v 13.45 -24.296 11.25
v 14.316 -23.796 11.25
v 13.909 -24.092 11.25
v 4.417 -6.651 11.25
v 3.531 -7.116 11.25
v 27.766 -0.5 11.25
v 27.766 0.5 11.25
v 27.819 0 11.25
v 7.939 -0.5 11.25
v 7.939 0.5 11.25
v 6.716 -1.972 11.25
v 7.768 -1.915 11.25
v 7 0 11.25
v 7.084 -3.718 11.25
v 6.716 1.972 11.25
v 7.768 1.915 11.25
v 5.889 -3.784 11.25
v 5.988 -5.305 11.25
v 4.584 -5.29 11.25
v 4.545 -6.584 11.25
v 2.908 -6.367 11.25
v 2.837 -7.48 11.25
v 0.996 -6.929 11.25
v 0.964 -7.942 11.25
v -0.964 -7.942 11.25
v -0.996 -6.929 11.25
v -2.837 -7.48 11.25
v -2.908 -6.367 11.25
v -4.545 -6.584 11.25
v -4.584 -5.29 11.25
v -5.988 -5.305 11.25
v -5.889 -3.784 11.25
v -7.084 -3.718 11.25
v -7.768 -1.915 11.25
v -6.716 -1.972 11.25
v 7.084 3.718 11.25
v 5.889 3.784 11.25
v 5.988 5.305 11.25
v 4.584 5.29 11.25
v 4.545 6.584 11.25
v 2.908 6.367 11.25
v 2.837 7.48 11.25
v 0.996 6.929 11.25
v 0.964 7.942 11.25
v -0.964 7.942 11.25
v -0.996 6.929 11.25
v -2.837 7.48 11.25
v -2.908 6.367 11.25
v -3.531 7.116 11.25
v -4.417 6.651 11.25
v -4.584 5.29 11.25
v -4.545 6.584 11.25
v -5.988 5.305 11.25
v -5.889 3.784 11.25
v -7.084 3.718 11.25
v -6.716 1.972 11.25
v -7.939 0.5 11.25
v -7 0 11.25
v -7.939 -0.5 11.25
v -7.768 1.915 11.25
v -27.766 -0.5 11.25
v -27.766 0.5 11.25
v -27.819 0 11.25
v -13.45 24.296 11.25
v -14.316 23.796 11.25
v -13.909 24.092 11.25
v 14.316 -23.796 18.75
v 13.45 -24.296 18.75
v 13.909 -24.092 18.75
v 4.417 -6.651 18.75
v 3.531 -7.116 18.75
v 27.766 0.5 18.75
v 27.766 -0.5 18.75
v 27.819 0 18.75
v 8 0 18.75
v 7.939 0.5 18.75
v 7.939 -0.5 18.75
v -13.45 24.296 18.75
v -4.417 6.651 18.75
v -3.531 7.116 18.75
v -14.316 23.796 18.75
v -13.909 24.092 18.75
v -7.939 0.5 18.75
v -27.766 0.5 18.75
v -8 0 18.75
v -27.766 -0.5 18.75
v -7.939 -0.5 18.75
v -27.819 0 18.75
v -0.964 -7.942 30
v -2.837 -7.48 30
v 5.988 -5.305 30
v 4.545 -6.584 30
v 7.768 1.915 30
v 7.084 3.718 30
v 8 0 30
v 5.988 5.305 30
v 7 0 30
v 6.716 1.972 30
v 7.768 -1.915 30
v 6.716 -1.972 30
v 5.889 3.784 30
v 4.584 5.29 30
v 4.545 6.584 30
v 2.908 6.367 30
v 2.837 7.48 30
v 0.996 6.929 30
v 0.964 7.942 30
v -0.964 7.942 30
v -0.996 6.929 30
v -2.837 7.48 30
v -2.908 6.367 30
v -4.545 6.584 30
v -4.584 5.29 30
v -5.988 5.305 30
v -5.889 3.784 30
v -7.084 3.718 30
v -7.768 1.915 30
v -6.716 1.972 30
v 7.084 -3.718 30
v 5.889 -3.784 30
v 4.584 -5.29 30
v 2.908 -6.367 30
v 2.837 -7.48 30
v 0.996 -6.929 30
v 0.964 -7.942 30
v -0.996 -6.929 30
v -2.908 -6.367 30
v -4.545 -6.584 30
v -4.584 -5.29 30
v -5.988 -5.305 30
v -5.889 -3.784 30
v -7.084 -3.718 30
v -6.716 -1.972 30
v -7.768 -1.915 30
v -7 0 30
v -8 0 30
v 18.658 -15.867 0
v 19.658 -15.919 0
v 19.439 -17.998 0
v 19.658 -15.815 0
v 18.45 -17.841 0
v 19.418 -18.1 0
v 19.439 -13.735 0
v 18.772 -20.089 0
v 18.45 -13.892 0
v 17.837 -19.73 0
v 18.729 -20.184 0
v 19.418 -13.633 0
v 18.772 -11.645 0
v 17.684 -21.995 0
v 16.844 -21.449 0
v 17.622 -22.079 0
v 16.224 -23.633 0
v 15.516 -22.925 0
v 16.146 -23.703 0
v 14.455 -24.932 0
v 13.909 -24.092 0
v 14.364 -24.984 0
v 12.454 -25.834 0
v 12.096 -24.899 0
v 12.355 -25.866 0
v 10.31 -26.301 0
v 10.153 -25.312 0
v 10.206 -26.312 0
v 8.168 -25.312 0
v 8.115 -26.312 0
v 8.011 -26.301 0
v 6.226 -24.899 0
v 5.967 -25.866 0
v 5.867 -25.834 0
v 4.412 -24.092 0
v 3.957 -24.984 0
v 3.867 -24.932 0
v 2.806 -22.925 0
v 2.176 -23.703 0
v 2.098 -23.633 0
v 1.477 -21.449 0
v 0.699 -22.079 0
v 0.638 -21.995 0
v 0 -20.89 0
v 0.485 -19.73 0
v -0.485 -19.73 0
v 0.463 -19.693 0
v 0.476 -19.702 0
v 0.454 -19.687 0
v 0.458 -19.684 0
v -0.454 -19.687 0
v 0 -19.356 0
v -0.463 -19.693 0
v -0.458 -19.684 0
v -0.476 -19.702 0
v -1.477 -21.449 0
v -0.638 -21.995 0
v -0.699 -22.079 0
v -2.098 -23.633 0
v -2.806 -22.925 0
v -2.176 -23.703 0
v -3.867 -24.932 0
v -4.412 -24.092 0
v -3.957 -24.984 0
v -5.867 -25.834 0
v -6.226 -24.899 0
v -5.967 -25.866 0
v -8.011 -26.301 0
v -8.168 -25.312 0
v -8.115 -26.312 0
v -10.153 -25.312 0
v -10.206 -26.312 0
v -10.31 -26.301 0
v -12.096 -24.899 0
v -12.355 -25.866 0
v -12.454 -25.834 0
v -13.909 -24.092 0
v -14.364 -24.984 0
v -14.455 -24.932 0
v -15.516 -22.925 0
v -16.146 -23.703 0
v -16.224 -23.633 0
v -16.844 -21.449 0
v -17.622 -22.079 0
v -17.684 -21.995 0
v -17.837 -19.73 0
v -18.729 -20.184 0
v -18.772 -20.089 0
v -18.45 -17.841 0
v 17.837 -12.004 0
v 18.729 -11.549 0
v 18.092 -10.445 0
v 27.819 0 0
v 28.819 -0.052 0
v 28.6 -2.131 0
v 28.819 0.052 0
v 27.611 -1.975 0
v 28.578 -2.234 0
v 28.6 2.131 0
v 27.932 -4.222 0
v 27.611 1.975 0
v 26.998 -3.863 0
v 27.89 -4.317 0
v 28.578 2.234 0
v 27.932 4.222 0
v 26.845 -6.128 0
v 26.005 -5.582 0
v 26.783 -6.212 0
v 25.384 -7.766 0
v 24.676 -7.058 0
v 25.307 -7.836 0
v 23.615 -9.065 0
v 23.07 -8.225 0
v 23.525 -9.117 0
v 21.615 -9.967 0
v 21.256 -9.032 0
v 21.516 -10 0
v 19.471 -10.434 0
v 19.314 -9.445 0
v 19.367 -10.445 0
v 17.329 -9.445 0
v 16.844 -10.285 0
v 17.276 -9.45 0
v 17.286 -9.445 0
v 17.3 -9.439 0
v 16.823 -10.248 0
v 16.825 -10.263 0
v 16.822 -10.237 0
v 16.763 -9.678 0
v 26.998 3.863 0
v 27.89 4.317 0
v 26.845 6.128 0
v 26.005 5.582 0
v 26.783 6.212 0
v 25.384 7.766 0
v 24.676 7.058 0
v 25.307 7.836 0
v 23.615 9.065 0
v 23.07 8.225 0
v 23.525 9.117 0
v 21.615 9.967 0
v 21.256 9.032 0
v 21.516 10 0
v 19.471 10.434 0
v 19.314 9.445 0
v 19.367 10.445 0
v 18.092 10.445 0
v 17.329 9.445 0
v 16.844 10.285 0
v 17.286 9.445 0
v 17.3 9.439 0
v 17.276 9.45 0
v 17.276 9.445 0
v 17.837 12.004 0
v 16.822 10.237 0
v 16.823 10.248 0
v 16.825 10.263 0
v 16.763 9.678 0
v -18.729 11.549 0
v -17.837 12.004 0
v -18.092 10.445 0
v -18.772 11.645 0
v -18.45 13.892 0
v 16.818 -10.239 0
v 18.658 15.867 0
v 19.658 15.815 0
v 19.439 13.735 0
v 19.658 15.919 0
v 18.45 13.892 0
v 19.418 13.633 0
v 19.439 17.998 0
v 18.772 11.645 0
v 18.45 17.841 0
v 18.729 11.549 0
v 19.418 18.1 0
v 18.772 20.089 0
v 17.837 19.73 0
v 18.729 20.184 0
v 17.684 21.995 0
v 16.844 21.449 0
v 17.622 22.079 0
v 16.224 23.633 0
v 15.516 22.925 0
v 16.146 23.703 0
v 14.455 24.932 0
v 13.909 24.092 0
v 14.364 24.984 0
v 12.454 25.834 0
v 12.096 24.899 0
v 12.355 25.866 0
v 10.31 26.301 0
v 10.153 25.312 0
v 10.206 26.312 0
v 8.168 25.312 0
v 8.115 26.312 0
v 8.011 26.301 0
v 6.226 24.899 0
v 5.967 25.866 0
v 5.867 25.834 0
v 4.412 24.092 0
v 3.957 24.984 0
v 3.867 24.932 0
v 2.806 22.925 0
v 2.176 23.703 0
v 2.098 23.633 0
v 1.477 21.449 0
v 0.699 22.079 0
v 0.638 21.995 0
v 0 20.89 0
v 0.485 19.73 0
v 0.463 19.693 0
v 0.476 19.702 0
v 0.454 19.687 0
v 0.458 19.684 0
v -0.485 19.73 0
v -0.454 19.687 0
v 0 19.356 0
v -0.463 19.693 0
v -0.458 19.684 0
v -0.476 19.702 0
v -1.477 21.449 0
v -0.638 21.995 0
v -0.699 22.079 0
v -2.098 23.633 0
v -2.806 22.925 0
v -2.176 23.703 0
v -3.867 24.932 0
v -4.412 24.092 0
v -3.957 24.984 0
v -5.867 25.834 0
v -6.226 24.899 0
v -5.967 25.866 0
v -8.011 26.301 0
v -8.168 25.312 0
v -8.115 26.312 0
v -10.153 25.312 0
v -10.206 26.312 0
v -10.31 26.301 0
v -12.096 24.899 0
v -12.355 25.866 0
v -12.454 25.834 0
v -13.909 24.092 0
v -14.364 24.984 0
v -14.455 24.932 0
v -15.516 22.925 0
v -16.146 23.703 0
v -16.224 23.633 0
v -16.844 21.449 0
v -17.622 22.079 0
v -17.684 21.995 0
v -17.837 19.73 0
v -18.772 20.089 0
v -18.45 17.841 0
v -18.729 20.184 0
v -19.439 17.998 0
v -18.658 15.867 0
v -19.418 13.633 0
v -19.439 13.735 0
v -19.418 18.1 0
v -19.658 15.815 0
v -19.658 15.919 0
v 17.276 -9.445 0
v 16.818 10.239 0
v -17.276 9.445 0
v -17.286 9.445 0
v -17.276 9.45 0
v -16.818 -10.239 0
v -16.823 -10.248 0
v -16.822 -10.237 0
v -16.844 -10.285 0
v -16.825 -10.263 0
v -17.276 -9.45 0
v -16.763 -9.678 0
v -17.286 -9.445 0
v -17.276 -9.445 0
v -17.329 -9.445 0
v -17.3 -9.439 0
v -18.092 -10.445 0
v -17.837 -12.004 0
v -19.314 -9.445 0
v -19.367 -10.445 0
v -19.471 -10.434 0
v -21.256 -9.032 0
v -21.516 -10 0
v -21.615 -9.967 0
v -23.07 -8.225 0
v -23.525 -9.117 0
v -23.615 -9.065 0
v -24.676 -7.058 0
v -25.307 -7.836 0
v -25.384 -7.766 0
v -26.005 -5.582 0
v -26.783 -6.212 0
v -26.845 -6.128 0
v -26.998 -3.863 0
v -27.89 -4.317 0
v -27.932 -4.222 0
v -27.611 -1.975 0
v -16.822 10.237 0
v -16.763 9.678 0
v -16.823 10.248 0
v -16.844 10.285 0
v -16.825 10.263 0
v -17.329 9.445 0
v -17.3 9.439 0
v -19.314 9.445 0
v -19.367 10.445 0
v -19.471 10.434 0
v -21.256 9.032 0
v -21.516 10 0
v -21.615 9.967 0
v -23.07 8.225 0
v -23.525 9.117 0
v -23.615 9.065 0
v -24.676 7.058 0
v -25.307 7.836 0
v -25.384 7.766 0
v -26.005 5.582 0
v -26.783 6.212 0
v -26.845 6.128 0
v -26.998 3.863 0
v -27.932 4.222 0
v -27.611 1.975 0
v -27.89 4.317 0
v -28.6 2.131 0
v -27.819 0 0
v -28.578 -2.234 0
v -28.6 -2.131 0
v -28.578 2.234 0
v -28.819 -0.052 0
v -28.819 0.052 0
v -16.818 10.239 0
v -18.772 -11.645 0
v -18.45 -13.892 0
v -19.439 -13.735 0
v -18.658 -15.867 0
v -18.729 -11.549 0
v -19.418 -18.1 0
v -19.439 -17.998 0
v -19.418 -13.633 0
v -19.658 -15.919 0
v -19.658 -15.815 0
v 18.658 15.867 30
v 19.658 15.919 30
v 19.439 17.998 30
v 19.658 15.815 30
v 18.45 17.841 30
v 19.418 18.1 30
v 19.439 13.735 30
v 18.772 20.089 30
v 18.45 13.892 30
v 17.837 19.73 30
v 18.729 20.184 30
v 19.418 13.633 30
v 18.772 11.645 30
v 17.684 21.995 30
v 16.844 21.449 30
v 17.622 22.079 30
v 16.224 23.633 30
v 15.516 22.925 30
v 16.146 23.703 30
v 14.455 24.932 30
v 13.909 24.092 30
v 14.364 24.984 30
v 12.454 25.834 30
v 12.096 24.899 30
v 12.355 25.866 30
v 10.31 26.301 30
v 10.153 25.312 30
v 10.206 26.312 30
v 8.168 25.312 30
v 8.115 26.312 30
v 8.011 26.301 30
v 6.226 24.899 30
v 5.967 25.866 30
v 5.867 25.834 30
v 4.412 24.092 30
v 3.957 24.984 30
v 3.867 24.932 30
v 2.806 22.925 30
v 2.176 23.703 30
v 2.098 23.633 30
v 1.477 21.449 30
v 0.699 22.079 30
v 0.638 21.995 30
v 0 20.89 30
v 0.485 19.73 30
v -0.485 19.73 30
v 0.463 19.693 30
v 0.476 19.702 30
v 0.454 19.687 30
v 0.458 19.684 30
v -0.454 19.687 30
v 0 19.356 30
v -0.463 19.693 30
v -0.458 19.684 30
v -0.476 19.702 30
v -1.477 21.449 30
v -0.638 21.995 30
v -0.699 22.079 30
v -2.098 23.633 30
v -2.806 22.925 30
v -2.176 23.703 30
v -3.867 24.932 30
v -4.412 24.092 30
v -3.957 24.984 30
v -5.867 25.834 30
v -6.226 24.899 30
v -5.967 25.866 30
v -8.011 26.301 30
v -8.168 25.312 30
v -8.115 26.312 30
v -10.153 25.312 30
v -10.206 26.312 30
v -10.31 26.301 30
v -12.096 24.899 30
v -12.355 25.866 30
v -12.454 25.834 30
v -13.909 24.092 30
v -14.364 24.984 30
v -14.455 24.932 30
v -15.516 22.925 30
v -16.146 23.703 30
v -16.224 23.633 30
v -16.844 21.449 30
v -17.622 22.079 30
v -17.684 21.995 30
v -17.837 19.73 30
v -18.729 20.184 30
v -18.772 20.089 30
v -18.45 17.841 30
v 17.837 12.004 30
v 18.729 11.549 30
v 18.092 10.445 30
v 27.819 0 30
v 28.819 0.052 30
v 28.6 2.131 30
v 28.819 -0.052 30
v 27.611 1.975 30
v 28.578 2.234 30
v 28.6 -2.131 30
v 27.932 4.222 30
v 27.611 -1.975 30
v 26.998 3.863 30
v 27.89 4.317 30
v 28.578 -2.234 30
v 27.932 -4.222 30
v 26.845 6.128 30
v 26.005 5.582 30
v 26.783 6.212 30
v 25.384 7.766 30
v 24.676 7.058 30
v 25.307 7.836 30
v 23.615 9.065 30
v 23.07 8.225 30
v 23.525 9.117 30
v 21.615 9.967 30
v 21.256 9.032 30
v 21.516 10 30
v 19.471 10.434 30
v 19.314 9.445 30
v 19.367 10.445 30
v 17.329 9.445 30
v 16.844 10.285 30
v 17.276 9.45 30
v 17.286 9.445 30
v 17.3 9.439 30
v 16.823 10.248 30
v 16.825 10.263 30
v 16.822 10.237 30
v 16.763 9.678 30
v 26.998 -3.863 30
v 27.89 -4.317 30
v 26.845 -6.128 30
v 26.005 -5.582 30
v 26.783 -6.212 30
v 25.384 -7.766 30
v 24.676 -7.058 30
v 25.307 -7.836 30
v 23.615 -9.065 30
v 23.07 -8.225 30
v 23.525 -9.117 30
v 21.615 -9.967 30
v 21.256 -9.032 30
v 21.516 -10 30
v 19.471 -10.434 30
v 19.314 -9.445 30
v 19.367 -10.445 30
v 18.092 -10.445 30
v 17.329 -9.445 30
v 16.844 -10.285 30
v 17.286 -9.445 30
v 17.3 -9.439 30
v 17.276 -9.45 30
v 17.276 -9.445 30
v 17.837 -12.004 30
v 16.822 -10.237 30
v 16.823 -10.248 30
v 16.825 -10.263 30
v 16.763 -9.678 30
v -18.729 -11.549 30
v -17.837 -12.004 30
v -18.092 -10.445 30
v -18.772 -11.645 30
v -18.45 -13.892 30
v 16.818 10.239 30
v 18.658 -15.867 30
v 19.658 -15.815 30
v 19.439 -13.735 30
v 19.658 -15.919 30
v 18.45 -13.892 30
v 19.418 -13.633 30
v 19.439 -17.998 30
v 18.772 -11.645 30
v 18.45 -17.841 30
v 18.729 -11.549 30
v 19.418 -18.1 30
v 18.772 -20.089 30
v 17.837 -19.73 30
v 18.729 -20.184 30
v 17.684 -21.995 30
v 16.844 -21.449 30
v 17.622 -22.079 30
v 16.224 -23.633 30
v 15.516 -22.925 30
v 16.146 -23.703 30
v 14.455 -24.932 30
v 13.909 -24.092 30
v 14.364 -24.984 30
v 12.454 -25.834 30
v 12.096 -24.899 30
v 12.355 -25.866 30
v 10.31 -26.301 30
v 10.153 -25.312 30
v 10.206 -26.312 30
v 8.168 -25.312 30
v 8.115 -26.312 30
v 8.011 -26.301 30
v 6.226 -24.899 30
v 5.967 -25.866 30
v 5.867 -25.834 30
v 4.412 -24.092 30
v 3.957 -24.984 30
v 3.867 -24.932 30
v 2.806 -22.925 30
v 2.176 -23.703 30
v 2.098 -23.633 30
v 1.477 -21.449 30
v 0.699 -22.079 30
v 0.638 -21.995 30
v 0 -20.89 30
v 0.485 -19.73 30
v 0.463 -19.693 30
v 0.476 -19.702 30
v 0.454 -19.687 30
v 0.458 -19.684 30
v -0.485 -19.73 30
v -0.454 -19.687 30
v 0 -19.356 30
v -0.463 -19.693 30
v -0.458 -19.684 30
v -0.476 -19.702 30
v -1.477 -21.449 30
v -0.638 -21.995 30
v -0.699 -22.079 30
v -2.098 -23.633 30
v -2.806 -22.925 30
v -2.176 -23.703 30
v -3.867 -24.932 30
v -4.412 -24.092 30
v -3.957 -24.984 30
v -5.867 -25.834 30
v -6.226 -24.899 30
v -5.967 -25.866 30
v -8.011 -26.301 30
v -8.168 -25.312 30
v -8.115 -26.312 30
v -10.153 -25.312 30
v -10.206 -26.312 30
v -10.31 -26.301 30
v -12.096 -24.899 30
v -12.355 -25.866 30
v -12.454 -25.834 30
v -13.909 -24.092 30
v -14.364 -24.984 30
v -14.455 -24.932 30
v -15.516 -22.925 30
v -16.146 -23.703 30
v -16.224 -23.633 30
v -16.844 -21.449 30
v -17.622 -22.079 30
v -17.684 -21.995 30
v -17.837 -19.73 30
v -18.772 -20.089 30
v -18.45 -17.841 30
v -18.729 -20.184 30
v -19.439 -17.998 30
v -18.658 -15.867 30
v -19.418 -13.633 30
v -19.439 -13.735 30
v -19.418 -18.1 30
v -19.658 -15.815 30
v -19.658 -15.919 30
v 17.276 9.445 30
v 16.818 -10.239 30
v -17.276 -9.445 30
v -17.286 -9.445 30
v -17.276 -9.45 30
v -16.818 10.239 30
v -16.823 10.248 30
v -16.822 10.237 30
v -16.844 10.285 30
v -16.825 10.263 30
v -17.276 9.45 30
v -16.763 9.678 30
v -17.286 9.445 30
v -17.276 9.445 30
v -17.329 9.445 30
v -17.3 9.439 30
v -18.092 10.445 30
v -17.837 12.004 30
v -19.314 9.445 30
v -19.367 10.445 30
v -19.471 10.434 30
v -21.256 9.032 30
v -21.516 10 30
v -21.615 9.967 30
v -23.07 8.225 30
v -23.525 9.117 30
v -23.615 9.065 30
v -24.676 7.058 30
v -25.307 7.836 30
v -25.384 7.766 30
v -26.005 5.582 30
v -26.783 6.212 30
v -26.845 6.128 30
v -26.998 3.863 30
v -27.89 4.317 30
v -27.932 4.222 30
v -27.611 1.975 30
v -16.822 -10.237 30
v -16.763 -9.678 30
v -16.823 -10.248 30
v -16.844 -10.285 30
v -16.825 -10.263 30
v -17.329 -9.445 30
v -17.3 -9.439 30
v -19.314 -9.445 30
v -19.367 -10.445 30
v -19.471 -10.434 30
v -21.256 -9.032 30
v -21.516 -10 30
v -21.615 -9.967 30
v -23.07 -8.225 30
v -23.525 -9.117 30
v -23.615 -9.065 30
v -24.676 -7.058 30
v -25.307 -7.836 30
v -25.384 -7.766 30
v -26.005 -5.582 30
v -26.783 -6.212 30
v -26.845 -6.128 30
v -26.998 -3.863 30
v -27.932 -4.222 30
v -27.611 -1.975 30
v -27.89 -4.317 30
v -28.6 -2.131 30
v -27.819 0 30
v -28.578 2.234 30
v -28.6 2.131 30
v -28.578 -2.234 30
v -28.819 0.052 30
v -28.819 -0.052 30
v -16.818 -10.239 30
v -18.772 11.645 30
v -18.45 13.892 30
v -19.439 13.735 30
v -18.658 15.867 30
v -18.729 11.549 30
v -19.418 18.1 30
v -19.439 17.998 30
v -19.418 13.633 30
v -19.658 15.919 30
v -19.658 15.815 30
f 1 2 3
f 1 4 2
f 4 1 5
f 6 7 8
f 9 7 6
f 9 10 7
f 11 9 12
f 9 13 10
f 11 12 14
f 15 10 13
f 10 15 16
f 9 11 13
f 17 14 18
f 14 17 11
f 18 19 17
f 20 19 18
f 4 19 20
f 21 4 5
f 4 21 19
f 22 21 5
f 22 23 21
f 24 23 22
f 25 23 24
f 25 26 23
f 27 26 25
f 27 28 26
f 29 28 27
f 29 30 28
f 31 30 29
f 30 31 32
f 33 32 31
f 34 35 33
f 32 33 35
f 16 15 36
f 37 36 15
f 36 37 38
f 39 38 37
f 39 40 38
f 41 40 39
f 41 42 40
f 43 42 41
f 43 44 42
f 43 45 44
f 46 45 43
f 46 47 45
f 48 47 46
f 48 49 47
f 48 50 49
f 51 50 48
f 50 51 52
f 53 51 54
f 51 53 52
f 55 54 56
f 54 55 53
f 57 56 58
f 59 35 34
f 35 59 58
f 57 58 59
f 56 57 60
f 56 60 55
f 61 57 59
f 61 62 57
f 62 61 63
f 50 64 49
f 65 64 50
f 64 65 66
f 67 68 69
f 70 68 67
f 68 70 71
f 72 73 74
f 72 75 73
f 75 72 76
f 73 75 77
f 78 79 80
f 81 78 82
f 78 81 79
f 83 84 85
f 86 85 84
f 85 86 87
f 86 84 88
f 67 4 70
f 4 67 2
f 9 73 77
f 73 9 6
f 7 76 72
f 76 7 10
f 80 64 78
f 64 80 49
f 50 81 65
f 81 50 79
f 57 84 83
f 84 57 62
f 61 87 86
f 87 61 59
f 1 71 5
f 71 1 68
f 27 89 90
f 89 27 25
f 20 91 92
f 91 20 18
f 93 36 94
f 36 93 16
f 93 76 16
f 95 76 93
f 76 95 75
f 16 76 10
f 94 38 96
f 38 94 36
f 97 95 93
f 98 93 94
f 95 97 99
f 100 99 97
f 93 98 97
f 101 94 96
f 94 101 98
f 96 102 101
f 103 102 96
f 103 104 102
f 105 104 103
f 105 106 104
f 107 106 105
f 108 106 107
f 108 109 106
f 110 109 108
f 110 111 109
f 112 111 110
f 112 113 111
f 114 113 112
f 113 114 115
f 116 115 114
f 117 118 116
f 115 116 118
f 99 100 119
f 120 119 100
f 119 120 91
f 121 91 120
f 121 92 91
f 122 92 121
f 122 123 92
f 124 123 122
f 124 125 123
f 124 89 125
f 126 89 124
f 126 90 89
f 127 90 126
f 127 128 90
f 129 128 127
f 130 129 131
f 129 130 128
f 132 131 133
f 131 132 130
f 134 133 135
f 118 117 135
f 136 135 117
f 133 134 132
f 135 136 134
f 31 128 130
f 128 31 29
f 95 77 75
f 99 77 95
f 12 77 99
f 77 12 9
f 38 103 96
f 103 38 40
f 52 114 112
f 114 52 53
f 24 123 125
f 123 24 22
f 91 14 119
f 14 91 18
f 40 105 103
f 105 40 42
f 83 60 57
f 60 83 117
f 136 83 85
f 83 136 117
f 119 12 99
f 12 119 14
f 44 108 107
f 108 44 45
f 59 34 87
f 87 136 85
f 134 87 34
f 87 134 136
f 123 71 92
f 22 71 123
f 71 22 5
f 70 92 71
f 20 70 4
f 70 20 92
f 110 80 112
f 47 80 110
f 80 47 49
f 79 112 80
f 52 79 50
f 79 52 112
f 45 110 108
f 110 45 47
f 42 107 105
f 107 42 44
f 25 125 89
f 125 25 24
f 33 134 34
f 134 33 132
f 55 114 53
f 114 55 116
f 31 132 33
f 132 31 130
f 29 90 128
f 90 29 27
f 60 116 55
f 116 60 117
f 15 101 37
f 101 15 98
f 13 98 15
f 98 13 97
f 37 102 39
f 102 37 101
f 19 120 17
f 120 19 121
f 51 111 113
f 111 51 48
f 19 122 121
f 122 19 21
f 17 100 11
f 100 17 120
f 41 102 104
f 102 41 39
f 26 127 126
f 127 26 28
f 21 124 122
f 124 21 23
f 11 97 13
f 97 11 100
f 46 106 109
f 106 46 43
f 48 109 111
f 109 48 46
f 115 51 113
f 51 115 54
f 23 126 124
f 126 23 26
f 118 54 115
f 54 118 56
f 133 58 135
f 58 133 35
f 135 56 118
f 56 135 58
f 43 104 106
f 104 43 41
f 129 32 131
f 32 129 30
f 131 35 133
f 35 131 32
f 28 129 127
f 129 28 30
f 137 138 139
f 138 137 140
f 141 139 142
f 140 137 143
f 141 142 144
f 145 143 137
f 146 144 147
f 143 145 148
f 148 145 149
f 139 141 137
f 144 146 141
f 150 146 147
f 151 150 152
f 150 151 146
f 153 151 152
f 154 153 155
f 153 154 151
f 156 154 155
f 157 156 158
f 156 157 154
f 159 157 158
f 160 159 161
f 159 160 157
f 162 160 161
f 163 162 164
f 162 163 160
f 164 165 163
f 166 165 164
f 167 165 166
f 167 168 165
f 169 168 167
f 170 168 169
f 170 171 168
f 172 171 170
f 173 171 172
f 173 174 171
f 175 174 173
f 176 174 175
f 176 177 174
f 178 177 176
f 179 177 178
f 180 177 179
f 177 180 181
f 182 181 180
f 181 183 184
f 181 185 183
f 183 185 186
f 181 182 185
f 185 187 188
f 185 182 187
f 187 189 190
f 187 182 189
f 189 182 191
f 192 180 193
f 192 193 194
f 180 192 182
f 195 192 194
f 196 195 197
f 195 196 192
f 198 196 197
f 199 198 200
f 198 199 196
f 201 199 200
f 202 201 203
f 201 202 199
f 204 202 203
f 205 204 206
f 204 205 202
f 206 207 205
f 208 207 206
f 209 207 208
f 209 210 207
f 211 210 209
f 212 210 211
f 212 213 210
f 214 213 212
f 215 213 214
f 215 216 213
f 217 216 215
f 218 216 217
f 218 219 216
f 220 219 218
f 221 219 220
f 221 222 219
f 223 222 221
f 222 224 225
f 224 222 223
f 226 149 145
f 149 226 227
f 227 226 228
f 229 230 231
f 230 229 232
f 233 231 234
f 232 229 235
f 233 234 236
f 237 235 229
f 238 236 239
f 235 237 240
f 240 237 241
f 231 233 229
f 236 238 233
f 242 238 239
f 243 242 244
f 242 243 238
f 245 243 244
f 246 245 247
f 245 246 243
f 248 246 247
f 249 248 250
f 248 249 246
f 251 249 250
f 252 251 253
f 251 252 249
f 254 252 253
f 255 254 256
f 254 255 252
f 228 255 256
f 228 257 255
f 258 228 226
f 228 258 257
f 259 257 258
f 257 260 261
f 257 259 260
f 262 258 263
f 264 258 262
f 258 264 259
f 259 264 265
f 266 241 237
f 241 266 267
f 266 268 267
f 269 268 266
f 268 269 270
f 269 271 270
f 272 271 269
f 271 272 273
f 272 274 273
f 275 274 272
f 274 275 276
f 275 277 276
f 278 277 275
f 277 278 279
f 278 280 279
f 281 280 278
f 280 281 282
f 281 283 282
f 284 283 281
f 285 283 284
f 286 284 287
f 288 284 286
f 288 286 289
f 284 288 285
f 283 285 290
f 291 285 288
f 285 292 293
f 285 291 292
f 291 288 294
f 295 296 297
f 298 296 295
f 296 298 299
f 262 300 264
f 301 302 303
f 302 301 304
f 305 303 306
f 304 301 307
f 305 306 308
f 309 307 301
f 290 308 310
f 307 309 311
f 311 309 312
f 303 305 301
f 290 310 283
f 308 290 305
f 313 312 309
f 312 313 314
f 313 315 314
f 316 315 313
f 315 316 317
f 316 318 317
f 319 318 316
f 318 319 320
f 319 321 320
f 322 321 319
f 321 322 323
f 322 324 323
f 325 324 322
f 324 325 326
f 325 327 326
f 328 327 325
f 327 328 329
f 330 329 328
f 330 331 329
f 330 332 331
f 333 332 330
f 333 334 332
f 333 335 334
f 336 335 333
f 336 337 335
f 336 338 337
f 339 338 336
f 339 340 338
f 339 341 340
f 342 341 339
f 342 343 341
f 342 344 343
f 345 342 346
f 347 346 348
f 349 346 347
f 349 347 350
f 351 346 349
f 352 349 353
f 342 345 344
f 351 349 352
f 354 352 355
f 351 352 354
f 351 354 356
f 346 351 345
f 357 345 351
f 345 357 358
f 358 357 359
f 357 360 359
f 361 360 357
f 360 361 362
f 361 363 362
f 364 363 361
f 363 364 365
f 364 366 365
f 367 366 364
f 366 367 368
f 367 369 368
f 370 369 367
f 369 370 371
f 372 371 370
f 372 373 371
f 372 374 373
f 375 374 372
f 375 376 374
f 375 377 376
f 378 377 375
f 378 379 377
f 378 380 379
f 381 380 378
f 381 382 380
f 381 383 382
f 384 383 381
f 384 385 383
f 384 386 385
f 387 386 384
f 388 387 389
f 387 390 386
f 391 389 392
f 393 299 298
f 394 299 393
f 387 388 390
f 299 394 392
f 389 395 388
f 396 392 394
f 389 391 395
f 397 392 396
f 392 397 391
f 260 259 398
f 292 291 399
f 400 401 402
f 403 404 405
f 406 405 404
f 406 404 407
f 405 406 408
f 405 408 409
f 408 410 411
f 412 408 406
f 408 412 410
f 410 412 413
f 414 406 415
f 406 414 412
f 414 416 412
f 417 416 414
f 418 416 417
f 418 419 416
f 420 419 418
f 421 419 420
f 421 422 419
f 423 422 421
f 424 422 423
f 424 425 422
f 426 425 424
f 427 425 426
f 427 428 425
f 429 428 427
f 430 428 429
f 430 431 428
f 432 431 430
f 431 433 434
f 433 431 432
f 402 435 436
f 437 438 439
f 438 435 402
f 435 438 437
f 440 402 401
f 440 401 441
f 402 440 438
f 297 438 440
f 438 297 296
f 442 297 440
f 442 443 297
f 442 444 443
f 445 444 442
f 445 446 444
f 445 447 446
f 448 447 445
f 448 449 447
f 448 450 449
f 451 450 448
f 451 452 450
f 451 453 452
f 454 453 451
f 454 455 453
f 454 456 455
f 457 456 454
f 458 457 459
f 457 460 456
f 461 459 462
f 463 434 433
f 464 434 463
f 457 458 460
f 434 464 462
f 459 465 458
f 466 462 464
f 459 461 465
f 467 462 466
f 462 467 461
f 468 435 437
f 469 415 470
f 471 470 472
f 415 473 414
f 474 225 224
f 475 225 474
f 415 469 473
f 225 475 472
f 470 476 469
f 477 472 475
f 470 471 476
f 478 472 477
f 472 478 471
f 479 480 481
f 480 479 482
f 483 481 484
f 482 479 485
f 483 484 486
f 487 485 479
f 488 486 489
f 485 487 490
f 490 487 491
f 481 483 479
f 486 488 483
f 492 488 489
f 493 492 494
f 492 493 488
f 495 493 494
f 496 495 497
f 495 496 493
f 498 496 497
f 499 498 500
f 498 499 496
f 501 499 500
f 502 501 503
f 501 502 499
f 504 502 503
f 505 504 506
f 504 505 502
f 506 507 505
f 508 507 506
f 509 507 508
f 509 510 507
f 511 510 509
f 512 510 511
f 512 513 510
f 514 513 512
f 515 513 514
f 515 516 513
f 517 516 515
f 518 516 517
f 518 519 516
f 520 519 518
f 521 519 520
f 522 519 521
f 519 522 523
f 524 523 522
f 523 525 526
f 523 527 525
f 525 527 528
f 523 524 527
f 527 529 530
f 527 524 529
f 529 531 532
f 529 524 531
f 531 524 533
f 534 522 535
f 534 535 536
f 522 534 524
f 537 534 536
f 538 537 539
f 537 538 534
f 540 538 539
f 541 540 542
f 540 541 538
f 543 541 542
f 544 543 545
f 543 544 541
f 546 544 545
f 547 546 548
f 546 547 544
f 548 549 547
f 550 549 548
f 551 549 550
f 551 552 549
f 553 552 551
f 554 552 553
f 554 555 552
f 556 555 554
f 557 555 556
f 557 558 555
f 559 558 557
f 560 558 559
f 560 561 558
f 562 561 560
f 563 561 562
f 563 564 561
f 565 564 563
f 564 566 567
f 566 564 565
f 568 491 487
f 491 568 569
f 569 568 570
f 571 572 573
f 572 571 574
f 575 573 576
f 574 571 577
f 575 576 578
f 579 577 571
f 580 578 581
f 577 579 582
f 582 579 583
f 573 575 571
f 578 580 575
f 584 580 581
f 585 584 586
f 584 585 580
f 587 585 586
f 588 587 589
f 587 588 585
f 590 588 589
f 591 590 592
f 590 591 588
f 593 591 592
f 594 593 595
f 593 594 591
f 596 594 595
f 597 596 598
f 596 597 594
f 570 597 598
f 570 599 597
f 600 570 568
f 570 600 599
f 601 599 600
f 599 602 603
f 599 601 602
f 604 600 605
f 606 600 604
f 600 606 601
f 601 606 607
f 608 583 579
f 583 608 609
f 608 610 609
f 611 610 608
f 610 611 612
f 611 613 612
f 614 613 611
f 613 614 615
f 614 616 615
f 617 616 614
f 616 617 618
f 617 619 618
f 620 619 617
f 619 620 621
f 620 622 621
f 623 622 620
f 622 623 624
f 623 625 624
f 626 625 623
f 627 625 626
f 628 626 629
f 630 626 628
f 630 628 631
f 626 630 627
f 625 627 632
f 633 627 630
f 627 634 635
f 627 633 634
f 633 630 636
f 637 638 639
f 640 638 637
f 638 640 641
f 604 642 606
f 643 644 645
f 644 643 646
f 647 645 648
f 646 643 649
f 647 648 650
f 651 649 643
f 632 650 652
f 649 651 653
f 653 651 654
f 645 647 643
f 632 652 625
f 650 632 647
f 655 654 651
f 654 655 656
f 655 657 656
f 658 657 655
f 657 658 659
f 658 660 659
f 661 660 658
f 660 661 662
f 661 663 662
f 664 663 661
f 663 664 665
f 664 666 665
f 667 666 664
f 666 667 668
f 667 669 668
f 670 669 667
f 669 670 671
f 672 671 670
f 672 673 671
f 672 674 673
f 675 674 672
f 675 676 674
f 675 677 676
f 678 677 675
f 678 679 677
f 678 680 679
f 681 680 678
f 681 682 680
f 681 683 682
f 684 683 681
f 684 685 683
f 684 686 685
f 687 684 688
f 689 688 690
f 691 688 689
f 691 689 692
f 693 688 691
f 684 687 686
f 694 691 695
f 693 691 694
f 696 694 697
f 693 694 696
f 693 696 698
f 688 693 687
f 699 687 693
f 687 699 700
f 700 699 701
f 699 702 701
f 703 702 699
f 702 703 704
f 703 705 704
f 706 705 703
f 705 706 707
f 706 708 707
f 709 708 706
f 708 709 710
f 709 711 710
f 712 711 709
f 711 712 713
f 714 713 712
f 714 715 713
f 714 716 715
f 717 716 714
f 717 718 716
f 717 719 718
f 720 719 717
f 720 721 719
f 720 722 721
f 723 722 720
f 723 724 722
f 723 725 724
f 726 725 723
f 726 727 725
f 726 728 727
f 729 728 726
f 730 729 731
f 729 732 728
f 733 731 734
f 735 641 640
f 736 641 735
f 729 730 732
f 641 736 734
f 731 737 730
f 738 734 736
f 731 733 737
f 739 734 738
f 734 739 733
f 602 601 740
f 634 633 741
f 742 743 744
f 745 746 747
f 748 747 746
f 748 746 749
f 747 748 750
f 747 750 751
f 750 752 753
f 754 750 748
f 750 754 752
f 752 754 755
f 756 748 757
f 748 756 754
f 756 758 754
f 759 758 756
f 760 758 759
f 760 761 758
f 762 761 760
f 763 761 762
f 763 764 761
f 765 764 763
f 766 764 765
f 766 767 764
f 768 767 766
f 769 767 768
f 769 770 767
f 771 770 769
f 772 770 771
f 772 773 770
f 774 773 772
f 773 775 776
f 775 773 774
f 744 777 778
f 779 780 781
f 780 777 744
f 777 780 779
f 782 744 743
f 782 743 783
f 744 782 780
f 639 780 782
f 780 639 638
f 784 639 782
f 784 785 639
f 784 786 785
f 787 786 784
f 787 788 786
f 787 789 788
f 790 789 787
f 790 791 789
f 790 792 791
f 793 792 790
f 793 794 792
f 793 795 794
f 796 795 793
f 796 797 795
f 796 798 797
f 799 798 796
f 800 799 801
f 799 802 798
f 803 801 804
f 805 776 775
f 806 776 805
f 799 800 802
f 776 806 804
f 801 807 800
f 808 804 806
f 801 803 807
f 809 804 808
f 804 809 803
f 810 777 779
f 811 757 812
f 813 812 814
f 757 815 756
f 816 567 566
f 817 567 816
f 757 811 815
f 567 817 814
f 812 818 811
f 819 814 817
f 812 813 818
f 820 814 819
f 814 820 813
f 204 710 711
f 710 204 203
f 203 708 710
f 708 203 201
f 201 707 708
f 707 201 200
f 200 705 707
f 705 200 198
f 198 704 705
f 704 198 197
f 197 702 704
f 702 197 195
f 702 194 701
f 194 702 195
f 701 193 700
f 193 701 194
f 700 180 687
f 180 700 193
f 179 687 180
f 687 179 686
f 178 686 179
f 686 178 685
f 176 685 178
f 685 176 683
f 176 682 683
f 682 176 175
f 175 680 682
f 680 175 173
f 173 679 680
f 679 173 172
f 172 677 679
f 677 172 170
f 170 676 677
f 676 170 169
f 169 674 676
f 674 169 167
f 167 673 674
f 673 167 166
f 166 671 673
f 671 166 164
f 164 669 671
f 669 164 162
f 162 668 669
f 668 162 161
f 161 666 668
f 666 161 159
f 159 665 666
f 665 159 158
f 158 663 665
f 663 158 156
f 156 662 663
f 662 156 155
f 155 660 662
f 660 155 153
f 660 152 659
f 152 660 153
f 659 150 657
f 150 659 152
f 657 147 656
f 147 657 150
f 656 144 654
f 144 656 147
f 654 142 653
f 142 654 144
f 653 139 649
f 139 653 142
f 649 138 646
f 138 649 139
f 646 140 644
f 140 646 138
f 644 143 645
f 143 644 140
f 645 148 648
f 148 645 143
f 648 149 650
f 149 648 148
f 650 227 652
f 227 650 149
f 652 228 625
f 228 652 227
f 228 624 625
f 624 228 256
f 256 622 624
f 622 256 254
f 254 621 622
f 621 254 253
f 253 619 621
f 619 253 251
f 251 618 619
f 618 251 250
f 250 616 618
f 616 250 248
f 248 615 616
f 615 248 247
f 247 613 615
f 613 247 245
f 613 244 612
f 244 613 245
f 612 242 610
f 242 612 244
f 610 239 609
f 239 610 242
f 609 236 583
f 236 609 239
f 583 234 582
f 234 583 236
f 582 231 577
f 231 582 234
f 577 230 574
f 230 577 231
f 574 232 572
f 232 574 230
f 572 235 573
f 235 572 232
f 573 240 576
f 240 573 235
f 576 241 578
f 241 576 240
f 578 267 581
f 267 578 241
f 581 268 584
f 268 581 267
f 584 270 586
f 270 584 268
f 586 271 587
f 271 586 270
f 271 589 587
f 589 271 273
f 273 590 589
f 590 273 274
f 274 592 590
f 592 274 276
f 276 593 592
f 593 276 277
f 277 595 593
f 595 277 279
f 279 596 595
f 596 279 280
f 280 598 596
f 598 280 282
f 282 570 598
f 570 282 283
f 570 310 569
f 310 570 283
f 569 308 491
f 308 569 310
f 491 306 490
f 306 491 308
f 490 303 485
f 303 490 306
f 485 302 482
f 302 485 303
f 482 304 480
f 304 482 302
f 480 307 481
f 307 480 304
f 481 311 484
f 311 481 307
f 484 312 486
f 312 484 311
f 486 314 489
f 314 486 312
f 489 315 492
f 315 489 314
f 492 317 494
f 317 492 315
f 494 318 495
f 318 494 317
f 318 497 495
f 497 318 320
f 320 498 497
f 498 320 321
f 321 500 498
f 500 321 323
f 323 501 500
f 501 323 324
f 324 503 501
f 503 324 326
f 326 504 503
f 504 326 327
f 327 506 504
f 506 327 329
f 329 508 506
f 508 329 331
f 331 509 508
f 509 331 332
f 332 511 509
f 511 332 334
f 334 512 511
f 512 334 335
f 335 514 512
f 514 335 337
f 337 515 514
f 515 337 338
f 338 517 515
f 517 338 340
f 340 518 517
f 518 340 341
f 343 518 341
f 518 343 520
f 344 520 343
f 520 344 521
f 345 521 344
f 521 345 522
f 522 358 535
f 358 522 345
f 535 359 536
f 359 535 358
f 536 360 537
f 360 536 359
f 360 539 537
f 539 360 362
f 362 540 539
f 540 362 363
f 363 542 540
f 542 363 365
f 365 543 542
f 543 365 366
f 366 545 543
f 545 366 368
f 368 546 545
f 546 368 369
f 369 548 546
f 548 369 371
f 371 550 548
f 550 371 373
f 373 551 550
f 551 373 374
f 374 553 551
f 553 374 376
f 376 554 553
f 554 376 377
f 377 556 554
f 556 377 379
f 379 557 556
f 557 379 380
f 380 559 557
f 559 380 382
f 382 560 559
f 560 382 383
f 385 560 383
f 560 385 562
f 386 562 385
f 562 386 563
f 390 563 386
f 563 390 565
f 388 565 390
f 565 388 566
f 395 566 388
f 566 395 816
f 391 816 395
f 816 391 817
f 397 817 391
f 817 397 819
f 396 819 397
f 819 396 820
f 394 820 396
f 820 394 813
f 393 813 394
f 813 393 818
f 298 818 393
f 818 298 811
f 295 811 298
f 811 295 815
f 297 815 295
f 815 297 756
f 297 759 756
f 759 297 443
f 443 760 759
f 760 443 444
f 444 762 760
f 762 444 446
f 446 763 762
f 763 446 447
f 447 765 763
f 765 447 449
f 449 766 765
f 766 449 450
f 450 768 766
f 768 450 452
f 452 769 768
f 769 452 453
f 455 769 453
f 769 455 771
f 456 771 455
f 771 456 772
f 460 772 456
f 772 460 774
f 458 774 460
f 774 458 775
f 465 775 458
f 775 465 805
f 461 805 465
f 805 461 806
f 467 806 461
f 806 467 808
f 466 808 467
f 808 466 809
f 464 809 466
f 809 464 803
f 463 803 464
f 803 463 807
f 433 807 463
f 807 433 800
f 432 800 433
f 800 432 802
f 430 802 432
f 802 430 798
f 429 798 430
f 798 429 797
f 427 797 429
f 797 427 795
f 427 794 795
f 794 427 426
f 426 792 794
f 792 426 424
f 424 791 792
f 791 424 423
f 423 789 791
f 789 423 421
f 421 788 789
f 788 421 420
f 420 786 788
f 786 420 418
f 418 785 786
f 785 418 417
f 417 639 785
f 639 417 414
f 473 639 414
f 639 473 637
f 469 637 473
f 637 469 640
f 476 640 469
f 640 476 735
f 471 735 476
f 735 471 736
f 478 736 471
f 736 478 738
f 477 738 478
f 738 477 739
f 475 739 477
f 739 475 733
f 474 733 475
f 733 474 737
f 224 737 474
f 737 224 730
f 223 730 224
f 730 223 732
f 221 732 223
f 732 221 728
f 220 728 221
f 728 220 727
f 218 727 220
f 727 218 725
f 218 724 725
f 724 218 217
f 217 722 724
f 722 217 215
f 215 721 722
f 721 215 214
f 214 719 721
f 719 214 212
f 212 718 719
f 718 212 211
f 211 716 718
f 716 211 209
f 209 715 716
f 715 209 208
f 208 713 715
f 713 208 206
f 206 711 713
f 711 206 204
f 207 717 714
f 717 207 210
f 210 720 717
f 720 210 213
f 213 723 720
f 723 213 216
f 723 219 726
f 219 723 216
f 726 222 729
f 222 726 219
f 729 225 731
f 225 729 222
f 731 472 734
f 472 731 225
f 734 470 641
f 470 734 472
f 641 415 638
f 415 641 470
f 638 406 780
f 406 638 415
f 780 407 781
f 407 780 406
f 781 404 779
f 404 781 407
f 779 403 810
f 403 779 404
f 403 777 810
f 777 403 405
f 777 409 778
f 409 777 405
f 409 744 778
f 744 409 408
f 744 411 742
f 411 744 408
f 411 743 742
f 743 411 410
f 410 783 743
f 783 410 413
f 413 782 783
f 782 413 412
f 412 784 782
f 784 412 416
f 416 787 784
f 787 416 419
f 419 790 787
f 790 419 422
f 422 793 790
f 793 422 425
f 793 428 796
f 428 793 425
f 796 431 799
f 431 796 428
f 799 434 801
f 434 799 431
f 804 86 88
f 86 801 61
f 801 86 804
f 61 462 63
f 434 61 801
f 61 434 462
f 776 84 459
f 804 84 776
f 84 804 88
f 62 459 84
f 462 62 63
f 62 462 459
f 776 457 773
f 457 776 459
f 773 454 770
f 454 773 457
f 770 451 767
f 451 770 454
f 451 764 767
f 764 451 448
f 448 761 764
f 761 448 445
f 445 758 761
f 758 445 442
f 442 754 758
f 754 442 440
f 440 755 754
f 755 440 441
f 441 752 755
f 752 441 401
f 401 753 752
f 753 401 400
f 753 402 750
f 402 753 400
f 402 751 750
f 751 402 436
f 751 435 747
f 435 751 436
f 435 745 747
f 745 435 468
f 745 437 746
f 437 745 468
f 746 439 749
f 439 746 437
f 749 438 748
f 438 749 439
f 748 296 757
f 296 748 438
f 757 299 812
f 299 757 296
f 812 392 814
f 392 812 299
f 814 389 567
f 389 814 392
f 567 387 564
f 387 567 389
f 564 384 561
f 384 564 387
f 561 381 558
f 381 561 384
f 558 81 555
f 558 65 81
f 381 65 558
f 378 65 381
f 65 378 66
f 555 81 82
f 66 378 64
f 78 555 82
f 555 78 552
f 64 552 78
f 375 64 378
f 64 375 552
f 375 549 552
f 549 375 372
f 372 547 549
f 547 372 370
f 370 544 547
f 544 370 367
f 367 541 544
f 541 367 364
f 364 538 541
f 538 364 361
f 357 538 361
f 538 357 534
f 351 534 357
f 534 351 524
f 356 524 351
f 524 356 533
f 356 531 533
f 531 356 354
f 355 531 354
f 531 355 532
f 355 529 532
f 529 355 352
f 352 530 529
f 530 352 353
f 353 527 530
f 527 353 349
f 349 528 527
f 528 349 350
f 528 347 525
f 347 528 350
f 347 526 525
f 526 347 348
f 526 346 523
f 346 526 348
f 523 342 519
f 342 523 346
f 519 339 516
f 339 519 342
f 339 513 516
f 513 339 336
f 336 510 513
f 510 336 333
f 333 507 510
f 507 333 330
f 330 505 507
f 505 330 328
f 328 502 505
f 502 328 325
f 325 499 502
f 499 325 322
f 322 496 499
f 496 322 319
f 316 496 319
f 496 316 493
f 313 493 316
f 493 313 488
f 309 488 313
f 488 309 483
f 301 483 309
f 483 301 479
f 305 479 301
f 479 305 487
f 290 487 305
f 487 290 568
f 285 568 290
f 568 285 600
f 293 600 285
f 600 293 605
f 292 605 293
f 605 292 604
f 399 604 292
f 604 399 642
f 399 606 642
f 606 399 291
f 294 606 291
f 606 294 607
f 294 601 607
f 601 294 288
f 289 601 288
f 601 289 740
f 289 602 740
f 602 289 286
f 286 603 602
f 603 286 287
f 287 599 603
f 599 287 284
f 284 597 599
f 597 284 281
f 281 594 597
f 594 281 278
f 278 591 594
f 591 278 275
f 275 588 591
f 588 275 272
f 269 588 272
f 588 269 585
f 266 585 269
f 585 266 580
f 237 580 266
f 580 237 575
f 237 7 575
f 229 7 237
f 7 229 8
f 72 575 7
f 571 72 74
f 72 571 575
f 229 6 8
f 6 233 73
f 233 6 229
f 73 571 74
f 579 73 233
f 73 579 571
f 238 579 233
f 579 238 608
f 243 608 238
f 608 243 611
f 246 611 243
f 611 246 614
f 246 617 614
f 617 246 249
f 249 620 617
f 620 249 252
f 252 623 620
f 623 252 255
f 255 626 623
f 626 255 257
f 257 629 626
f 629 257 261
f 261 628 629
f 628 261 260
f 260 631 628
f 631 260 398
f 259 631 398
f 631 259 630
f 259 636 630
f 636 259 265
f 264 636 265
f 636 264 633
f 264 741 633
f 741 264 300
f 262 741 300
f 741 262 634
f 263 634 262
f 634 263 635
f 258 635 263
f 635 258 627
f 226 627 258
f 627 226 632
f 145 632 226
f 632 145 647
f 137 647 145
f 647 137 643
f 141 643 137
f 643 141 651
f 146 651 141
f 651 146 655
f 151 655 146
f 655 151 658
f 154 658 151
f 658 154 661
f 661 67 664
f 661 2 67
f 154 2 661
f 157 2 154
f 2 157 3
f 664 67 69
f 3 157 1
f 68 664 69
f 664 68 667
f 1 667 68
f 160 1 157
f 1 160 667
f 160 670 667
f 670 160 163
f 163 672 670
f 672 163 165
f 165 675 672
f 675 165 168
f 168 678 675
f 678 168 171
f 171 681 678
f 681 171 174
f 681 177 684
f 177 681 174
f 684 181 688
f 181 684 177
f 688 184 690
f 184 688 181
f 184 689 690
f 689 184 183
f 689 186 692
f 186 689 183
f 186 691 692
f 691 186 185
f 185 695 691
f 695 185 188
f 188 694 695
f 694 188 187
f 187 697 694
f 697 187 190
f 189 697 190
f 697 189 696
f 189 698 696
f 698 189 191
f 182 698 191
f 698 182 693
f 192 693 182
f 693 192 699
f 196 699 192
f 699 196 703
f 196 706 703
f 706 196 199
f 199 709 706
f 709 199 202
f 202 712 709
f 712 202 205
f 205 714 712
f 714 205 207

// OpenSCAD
module flower(height=1, size=4, expand=5) {
    circle(expand, expand);
    translate([expand,0,0]) circle(size, size);
    rotate([0, 0, 60]) translate([expand,0,0]) circle(size, size);
    rotate([0, 0, 120]) translate([expand,0,0]) circle(size, size);
    rotate([0, 0, 180]) translate([expand,0,0]) circle(size, size);
    rotate([0, 0, 240]) translate([expand,0,0]) circle(size, size);
    rotate([0, 0, 300]) translate([expand,0,0]) circle(size, size);
}

module mold(thickness = 1, radius = 10, expend = 20) {
    difference() {
        offset(r=thickness/2) {
            flower(20, radius, expand);
        }
        offset(r=-thickness/2) {
            flower(20, radius, expand);
        }
    }
}

height = 30;
factor = 1.8;
length = 57; 
thickness = 1;
// expand = radius * factor
// length = radius + expand + expand + radius
// length = 2 * (radius + expand)
// length = 2 * (radius + radius * factor)
// length = 2 * radius * (1 + factor)
radius = length / ( 2 * (1 + factor) );
expand = radius * factor;
h = height / 4;

linear_extrude(height) {
    mold();
}

difference() {
    translate([0,0,height / 2 - h / 2]) {
        linear_extrude(height/4) {
            rotate([0, 0, 30]) {
                square([ thickness, 2 * (radius + expand) ], center = true);
            }
            rotate([0, 0, 90]) {
                    square([ thickness, 2 * (radius + expand) ], center = true);
            }
        }
        cylinder(height / 2 + h / 2, 8, 8);
    }
    cylinder(height, 8 - thickness, 8 - thickness);
}
